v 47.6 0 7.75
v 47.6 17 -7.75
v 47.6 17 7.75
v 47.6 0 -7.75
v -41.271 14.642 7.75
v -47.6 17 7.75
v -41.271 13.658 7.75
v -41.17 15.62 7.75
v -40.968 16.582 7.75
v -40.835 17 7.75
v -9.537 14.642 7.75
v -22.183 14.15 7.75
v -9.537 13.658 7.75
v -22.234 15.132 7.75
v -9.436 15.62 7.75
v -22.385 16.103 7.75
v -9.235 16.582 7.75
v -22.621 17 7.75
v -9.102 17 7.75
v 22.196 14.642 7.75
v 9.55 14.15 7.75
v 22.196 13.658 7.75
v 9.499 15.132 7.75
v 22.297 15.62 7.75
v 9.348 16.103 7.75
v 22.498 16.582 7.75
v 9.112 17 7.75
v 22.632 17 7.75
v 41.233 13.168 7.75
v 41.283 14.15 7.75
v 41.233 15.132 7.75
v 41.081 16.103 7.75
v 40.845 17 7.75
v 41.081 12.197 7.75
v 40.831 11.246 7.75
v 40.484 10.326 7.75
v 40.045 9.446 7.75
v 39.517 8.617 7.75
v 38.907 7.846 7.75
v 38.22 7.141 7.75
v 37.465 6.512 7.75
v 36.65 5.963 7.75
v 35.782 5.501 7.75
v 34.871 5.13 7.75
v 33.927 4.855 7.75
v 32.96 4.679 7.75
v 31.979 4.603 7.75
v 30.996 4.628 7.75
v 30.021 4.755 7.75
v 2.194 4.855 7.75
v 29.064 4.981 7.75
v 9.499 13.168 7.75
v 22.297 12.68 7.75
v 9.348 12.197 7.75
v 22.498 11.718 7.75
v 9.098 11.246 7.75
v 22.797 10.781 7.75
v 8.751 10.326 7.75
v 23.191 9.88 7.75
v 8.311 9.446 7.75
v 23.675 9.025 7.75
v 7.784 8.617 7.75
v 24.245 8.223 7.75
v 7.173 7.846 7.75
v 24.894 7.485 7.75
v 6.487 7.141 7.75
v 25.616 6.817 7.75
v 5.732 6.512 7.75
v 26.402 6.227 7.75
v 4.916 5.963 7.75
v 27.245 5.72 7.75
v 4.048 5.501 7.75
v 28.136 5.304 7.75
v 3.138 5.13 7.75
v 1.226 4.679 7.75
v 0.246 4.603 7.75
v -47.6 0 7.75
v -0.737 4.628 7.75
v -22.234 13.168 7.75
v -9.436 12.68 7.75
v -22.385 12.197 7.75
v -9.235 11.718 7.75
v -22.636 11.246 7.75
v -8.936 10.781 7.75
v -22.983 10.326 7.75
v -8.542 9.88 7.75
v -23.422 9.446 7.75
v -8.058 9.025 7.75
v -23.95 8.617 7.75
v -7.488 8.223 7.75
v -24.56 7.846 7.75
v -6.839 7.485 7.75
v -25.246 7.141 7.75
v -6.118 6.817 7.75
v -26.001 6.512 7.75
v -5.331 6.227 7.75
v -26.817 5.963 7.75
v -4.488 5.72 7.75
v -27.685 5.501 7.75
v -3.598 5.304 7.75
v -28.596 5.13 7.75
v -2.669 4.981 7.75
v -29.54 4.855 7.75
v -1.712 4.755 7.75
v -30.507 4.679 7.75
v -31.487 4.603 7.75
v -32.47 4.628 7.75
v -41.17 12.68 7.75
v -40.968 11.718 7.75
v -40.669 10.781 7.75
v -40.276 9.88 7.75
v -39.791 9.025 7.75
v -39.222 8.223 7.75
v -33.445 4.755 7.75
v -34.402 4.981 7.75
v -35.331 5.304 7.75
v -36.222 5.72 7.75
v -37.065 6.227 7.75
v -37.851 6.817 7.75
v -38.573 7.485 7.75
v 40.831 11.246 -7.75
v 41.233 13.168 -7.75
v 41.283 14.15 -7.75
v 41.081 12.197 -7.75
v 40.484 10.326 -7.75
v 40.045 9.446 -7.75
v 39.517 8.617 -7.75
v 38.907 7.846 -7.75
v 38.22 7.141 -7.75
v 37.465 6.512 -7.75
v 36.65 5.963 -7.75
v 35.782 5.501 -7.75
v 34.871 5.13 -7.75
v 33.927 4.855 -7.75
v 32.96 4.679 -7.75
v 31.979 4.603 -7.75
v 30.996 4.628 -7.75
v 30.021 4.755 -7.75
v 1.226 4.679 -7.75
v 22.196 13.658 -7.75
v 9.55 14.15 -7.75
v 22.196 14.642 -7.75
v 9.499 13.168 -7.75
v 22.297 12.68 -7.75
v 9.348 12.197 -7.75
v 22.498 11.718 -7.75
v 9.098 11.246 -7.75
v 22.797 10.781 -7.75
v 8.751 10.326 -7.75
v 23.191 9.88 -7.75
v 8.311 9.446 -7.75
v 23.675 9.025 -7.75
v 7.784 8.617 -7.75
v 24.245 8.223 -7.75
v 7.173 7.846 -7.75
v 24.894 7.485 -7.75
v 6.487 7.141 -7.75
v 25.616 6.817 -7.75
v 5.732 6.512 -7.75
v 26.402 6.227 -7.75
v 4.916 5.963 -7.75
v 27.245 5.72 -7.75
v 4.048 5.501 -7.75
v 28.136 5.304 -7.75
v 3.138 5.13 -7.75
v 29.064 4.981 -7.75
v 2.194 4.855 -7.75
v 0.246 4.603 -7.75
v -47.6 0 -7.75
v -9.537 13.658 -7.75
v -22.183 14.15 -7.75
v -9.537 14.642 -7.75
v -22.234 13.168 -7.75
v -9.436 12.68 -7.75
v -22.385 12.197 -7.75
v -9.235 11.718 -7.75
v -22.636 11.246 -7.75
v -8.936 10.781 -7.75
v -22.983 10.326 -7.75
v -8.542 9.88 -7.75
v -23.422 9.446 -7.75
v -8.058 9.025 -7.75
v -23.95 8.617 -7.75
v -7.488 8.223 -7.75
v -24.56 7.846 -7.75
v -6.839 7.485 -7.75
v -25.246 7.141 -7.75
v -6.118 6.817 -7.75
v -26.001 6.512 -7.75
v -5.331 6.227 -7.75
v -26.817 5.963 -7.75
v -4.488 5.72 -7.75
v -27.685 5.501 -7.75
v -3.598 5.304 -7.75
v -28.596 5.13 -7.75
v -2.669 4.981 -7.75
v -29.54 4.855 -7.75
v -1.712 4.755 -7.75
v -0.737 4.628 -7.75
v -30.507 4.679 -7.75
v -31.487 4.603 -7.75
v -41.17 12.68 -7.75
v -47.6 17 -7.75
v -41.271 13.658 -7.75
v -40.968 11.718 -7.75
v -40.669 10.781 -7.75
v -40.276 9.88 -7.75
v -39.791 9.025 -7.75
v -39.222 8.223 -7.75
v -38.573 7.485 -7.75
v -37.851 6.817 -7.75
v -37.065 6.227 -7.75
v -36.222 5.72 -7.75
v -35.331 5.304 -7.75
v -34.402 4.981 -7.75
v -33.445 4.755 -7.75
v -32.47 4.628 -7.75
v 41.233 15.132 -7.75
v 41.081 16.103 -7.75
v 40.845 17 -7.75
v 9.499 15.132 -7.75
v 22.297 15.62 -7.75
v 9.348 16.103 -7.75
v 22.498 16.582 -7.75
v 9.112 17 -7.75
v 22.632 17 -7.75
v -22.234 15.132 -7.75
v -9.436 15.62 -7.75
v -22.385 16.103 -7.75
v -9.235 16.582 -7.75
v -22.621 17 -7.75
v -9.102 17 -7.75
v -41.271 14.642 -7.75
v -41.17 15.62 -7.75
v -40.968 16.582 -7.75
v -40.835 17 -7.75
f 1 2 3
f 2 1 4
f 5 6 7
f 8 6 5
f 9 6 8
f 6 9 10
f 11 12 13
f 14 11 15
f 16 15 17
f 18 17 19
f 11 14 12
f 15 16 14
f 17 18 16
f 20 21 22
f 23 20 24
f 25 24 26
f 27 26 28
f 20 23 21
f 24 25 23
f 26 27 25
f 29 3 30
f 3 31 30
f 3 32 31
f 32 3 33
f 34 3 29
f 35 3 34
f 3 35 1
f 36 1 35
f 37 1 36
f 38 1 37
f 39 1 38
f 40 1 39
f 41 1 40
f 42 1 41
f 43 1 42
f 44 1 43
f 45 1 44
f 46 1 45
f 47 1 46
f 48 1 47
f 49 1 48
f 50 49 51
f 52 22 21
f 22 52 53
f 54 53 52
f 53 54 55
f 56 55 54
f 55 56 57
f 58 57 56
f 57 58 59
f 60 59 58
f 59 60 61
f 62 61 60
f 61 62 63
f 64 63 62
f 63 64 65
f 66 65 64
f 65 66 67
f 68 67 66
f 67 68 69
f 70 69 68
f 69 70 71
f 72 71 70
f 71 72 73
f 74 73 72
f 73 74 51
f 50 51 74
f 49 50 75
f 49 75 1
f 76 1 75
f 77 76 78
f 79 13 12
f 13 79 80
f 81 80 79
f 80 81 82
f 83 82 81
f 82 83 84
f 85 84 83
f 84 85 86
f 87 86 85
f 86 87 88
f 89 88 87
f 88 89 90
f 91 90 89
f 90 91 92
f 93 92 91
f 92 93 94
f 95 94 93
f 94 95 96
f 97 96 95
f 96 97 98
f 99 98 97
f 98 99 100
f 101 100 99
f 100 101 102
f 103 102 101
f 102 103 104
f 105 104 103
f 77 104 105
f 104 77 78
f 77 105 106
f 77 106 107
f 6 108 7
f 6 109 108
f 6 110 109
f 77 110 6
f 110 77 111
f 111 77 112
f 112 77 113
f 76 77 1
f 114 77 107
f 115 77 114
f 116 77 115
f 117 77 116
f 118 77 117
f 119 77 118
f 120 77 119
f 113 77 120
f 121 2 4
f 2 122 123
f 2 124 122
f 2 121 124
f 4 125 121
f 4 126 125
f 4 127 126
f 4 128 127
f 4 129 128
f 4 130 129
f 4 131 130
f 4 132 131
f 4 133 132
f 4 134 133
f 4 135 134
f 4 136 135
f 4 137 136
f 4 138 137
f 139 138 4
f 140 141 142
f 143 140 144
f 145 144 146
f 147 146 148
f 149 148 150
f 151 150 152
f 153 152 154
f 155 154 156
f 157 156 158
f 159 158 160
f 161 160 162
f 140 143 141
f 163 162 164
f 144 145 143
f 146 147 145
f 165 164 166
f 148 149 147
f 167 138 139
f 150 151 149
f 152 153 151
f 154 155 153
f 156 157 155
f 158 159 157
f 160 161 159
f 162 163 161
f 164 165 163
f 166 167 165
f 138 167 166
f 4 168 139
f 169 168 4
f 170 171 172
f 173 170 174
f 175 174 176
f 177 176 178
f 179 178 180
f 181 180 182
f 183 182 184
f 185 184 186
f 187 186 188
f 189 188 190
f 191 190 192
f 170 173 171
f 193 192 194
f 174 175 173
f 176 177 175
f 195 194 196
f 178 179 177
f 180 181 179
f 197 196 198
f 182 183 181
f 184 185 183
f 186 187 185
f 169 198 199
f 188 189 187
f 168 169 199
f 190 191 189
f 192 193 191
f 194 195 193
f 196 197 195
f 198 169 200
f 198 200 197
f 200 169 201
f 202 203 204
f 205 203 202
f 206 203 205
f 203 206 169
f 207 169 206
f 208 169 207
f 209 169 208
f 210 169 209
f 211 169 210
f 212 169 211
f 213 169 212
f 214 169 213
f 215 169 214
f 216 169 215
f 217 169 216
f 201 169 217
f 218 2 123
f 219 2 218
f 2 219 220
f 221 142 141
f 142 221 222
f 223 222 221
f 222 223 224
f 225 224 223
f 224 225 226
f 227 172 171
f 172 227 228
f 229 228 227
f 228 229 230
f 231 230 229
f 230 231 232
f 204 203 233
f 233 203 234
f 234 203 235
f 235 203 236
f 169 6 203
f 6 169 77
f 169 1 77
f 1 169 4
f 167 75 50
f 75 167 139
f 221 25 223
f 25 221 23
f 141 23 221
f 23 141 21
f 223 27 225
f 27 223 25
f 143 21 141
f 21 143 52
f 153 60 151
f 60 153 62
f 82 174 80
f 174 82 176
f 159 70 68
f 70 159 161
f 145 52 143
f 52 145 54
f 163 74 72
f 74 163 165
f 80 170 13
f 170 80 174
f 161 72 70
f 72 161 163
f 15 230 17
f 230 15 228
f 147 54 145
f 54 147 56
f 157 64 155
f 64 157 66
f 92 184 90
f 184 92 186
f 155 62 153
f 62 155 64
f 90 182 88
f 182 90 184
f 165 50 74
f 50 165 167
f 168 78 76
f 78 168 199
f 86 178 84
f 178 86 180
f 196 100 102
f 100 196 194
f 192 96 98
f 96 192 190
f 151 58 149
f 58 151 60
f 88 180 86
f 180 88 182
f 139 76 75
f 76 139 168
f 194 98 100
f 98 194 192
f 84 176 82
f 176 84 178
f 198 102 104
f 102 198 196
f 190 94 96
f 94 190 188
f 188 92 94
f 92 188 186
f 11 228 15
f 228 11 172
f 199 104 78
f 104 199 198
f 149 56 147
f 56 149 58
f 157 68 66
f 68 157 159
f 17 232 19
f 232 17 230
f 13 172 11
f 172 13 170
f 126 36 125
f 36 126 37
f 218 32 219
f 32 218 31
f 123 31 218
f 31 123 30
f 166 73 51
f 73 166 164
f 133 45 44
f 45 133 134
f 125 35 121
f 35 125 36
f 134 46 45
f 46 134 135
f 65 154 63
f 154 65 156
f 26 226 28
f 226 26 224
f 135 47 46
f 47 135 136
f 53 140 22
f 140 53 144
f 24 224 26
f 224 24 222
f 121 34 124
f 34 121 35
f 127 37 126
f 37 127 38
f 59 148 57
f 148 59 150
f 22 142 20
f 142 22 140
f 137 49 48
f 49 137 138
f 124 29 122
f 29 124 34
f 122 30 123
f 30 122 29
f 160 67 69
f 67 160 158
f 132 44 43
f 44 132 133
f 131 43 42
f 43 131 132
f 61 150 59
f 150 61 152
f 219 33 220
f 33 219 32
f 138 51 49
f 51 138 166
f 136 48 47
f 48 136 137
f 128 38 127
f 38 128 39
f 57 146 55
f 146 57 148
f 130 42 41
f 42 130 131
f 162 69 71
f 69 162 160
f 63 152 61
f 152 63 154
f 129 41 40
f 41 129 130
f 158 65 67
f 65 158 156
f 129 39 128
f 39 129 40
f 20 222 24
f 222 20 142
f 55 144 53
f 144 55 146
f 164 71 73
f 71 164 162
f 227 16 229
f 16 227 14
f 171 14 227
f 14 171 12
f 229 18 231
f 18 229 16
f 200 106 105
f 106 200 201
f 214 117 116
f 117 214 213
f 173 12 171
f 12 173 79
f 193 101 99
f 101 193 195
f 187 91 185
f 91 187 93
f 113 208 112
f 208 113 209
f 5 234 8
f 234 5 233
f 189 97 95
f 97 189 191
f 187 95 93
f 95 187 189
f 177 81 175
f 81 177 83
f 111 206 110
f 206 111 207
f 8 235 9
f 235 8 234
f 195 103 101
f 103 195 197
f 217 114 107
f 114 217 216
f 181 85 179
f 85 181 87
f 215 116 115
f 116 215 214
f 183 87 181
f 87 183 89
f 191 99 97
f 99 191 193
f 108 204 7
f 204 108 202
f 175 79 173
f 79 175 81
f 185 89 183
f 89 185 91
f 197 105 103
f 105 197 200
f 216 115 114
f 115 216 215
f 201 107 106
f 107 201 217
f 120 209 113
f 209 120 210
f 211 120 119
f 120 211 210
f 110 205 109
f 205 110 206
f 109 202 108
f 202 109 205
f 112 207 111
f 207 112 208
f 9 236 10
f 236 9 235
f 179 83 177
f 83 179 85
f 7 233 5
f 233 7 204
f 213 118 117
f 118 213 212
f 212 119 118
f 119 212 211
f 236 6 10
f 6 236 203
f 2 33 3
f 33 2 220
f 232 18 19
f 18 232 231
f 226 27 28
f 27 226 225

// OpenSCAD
// all measurements are in millimeters

Box_width = 95.2;
Box_hight = 20;
Cylinder_hight = 4.6+(19.1/2);
Cylinder_offset = Box_width/3;
Cutoff_hight = 32;

union()
{
    difference()
    {    
    translate([0,Box_hight/2,0])    
    cube([Box_width,Box_hight,15.5 ],true); //box
                //3 holes for casts
     translate([0,Cylinder_hight,-20])
    cylinder(d = 19.1, h = 40, $fs = 1,$fa  = 1); 
     translate([Cylinder_offset,Cylinder_hight,-20])
    cylinder(d = 19.1, h = 40, $fs = 1,$fa  = 1); 
     translate([-Cylinder_offset,Cylinder_hight,-20])
    cylinder(d = 19.1, h = 40, $fs = 1,$fa  = 1);     
    translate([0,Cutoff_hight,0])
    cube([Box_width,30,15.5 ],true); //Cutoff
    }
    
      
}
